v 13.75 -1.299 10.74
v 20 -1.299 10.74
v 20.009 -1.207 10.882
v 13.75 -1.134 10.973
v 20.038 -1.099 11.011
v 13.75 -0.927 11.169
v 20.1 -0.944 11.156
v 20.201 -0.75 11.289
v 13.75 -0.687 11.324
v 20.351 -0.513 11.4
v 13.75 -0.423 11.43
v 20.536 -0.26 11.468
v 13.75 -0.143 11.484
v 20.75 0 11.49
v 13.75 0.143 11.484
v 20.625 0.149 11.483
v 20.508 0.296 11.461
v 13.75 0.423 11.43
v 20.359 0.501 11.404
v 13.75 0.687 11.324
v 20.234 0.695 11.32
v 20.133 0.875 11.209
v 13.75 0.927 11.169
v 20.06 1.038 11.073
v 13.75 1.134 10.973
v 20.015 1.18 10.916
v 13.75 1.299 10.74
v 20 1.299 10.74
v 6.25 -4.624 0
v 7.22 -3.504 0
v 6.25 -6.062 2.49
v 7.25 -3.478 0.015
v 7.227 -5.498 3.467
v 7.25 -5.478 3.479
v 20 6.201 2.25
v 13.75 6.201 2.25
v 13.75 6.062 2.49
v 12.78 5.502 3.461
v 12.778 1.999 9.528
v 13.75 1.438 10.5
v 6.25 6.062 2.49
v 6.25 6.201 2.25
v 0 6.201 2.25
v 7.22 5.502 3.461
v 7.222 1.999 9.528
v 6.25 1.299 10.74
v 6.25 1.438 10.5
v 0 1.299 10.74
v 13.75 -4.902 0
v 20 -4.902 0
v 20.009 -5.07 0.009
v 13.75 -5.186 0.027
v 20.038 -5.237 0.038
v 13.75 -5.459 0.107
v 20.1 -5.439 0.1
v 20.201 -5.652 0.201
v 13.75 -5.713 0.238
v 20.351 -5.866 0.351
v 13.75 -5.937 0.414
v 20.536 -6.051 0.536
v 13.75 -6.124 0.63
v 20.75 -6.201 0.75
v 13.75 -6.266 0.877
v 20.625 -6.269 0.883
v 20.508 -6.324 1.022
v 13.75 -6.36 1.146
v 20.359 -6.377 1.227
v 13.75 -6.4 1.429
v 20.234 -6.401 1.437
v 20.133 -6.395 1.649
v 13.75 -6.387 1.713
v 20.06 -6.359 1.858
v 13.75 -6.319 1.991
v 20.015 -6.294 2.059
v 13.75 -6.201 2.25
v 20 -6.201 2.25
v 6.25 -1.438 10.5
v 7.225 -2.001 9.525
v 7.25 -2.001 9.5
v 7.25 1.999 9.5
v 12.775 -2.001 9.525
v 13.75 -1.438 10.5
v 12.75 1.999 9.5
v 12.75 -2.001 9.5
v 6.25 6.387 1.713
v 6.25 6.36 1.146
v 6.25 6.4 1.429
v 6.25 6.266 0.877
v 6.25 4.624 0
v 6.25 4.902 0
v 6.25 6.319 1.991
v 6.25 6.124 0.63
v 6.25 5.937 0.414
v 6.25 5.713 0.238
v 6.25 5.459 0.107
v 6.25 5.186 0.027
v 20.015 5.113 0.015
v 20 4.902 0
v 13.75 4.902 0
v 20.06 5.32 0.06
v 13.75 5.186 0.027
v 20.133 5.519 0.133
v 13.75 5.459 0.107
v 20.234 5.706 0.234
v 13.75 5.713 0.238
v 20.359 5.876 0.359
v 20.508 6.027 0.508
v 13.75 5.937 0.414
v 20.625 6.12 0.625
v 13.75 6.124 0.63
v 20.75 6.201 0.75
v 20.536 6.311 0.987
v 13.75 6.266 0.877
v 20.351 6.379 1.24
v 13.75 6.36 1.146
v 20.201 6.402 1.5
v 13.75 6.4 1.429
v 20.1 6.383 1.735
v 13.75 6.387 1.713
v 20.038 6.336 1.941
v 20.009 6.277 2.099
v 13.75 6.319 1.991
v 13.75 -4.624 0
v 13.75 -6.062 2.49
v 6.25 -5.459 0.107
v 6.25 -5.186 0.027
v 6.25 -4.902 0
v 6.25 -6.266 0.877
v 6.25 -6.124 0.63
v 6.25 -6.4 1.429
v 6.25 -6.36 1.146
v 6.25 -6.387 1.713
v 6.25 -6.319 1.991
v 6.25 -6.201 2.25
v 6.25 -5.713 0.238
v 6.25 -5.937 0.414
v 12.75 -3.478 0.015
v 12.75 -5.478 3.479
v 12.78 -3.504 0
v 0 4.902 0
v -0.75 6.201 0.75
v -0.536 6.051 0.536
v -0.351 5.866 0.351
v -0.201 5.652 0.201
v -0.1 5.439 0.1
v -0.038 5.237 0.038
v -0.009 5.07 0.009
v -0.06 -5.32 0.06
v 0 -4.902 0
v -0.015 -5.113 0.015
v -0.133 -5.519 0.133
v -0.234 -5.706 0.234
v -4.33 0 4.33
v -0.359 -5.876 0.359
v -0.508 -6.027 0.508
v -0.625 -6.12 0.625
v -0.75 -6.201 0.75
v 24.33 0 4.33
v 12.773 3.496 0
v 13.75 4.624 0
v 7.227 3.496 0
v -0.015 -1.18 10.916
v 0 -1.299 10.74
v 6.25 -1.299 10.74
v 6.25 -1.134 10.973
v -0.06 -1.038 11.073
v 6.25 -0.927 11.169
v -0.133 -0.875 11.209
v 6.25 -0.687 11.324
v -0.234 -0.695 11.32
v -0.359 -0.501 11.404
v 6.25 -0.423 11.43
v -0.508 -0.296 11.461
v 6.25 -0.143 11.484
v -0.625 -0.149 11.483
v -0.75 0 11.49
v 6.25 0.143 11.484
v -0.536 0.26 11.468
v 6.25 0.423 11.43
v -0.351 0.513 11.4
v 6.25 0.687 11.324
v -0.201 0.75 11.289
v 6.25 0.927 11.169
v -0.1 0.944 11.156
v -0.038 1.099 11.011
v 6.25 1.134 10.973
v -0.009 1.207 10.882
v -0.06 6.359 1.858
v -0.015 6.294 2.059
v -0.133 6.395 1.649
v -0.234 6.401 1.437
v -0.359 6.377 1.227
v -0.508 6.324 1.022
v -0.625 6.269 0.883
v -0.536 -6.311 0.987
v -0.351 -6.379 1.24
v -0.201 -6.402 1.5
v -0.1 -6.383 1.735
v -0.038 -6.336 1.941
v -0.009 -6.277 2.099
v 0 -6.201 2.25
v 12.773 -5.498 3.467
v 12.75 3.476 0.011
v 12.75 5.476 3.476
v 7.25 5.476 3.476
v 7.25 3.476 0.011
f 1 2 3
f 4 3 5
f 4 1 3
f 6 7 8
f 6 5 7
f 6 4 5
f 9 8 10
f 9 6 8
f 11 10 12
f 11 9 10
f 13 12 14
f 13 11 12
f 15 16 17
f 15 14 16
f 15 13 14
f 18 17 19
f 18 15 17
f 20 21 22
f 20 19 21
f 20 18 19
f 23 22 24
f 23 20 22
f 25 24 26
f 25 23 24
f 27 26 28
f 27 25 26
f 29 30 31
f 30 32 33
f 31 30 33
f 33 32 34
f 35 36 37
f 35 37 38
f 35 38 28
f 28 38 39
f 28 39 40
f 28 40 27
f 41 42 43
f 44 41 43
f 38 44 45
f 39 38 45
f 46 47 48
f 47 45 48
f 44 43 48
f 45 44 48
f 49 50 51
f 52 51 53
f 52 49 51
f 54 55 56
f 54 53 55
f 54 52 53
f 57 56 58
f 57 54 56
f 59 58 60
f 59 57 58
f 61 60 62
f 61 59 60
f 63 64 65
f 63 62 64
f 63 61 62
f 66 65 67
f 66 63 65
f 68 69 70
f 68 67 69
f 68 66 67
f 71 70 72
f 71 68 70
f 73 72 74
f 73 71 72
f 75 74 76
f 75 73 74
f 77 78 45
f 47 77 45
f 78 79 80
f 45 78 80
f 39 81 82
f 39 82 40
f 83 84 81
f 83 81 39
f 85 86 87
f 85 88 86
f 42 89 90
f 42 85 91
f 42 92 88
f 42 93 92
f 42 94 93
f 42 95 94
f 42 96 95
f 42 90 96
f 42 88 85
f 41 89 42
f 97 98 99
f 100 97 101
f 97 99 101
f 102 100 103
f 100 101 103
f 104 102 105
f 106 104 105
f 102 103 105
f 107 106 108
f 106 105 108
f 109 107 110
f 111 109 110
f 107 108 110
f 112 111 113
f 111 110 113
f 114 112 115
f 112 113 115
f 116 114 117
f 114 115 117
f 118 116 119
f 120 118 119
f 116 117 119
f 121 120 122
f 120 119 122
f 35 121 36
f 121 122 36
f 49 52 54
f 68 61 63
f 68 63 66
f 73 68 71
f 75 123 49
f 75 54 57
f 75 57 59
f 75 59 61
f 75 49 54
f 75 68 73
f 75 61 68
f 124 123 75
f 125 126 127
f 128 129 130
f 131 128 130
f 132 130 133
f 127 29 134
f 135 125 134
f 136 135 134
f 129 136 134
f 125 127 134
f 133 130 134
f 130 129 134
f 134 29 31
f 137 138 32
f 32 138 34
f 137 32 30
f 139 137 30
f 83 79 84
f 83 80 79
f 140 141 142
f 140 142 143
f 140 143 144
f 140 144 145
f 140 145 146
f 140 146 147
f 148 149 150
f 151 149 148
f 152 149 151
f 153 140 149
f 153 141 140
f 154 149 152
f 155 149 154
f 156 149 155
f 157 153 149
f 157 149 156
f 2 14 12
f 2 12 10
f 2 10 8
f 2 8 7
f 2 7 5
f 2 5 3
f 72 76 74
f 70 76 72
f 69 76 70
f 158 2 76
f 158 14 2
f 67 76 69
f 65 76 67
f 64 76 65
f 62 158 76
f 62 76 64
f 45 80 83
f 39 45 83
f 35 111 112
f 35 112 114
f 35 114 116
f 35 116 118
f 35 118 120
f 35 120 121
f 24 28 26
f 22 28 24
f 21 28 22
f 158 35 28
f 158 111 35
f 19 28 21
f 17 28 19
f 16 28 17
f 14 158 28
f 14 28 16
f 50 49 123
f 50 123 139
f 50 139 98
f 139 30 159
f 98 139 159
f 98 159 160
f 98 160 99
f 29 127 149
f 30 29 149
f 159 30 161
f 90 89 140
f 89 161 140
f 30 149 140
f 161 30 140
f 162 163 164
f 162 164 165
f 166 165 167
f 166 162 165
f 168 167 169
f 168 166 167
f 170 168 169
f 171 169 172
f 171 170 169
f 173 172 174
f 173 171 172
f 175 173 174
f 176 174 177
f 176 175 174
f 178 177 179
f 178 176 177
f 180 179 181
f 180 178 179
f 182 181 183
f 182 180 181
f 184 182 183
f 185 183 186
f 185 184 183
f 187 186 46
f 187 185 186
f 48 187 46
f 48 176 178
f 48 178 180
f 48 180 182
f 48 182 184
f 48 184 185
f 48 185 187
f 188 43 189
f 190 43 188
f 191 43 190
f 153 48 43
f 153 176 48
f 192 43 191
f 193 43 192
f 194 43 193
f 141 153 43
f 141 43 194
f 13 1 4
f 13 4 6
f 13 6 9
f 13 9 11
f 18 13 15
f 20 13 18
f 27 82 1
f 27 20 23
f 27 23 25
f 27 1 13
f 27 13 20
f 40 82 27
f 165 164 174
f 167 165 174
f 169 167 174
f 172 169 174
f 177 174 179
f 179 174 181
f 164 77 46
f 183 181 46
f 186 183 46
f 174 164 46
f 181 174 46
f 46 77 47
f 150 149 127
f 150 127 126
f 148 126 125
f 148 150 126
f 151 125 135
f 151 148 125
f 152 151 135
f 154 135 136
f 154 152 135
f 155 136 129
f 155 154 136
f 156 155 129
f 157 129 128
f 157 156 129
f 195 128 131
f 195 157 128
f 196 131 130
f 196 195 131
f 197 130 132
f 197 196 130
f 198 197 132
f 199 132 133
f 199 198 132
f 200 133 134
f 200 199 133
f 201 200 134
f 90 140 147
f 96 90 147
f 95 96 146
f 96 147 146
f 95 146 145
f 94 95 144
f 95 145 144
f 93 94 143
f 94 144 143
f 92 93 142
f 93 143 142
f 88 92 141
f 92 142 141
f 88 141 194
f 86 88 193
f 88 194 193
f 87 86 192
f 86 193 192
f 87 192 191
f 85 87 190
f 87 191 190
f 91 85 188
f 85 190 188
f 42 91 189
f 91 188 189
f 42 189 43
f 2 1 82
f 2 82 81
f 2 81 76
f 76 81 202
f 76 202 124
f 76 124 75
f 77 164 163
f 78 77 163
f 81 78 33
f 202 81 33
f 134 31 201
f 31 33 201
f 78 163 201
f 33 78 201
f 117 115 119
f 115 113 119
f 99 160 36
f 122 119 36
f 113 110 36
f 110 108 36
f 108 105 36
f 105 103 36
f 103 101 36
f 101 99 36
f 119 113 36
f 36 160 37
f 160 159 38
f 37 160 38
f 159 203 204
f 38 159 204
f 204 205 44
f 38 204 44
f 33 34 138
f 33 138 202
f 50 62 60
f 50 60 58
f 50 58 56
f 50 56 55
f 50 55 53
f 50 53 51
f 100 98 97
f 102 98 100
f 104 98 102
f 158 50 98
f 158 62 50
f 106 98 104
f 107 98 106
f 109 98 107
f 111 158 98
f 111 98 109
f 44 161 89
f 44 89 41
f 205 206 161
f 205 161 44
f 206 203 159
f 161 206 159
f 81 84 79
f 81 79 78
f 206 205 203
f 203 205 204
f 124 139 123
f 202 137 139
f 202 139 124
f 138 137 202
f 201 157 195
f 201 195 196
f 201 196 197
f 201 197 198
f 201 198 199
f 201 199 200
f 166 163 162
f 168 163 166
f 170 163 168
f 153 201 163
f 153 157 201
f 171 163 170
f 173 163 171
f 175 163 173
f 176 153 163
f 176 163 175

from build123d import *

# Parameters (mm, degrees)
F1_DEPTH    = 20
F4_T1_DEPTH = 32.9903810568
F6_START    = 9.5
F5_W        = 7.5
F5_H        = 4
F6_DEPTH    = 10.5
F8_START    = -9.5
F7_W        = 7.5
F7_H        = 4
F8_DEPTH    = 15.5
F10_START   = -9.5
F9_W        = 7.5
F9_H        = 4
F10_DEPTH   = 10.5
F11_SIZE    = 1


# Not quite as in the source:
# - a fillet or chamfer that OpenCascade refuses, or shapes differently, is made with other operations: its cross-section is extruded or revolved along the edge and cut away or added
# - an extrude whose draft closes it to a point is written as a loft to that point


with BuildPart() as f1:
    # F0 (on Right) → F1 (new body)
    with BuildSketch(Plane.YZ):
        Polygon((-7.5, 0), (7.5, 0), (0, 12.9903810568), align=None)
    extrude(amount=F1_DEPTH)

    # F1_face (on face) → F2 section 0
    with BuildSketch(Plane(origin=(0, 0, 4.3301270189), x_dir=(0, 1, 0), z_dir=(-1, 0, 0)), mode=Mode.PRIVATE) as f2_s0:
        Polygon((7.5, 4.3301270189), (-7.5, 4.3301270189), (0, -8.6602540378), align=None)
    loft([f2_s0.sketch, Vertex(-4.3301270189, 0, 4.3301270189)], ruled=True)

    # F1_face1 (on face) → F3 section 0
    with BuildSketch(Plane(origin=(20, 0, 4.3301270189), x_dir=(0, 1, 0), z_dir=(1, 0, 0)), mode=Mode.PRIVATE) as f3_s0:
        Polygon((-7.5, -4.3301270189), (7.5, -4.3301270189), (0, 8.6602540378), align=None)
    loft([f3_s0.sketch, Vertex(24.3301270189, 0, 4.3301270189)], ruled=True)

    # F4: fillet of radius 1.5 on 3 edges, made by hand

    # F4_s2 → F4_t1 (cut)
    with BuildSketch(Plane.YZ.offset(-6.4951905284)):
        with BuildLine():
            ThreePointArc((-1.2990381057, 10.7403810568), (0, 11.4903810568), (1.2990381057, 10.7403810568))
            Line((1.2990381057, 10.7403810568), (0, 12.9903810568))
            Line((0, 12.9903810568), (-1.2990381057, 10.7403810568))
        make_face()
        with BuildLine():
            ThreePointArc((-4.9019237886, 0), (-6.2009618943, 0.75), (-6.2009618943, 2.25))
            Line((-6.2009618943, 2.25), (-7.5, 0))
            Line((-7.5, 0), (-4.9019237886, 0))
        make_face()
        with BuildLine():
            ThreePointArc((4.9019237886, 0), (6.2009618943, 0.75), (6.2009618943, 2.25))
            Line((6.2009618943, 2.25), (7.5, 0))
            Line((7.5, 0), (4.9019237886, 0))
        make_face()
    extrude(amount=F4_T1_DEPTH, mode=Mode.SUBTRACT)

    # F5 (on Top) → F6 (cut)
    with BuildSketch(Plane.XY.offset(F6_START)):
        with Locations((10, -0.0009618943)):
            Rectangle(F5_W, F5_H)
    extrude(amount=F6_DEPTH, mode=Mode.SUBTRACT)

    # F7 (on face) → F8 (cut)
    with BuildSketch(Plane(origin=(0, -5.625, 3.2475952642), x_dir=(1, 0, 0), z_dir=(0, -0.8660254038, 0.5)).offset(F8_START)):
        with Locations((10, 3.7480762114)):
            Rectangle(F7_W, F7_H)
    extrude(amount=-F8_DEPTH, mode=Mode.SUBTRACT)

    # F9 (on face) → F10 (cut)
    with BuildSketch(Plane(origin=(0, 5.625, 3.2475952642), x_dir=(-1, 0, 0), z_dir=(0, 0.8660254038, 0.5)).offset(F10_START)):
        with Locations((-10, 3.7519237886)):
            Rectangle(F9_W, F9_H)
    extrude(amount=-F10_DEPTH, mode=Mode.SUBTRACT)

    # F11
    f11_edges = [f1.edges().sort_by_distance(p)[0] for p in [
        (6.25, 4.476279, 1.743524),
        (13.75, 4.476279, 1.743524),
        (6.25, -4.478203, 1.746857),
        (13.75, -4.478203, 1.746857),
        (6.25, -0.000962, 9.5),
        (13.75, -0.000962, 9.5),
    ]]
    chamfer(f11_edges, length=F11_SIZE)


solid = f1.part
